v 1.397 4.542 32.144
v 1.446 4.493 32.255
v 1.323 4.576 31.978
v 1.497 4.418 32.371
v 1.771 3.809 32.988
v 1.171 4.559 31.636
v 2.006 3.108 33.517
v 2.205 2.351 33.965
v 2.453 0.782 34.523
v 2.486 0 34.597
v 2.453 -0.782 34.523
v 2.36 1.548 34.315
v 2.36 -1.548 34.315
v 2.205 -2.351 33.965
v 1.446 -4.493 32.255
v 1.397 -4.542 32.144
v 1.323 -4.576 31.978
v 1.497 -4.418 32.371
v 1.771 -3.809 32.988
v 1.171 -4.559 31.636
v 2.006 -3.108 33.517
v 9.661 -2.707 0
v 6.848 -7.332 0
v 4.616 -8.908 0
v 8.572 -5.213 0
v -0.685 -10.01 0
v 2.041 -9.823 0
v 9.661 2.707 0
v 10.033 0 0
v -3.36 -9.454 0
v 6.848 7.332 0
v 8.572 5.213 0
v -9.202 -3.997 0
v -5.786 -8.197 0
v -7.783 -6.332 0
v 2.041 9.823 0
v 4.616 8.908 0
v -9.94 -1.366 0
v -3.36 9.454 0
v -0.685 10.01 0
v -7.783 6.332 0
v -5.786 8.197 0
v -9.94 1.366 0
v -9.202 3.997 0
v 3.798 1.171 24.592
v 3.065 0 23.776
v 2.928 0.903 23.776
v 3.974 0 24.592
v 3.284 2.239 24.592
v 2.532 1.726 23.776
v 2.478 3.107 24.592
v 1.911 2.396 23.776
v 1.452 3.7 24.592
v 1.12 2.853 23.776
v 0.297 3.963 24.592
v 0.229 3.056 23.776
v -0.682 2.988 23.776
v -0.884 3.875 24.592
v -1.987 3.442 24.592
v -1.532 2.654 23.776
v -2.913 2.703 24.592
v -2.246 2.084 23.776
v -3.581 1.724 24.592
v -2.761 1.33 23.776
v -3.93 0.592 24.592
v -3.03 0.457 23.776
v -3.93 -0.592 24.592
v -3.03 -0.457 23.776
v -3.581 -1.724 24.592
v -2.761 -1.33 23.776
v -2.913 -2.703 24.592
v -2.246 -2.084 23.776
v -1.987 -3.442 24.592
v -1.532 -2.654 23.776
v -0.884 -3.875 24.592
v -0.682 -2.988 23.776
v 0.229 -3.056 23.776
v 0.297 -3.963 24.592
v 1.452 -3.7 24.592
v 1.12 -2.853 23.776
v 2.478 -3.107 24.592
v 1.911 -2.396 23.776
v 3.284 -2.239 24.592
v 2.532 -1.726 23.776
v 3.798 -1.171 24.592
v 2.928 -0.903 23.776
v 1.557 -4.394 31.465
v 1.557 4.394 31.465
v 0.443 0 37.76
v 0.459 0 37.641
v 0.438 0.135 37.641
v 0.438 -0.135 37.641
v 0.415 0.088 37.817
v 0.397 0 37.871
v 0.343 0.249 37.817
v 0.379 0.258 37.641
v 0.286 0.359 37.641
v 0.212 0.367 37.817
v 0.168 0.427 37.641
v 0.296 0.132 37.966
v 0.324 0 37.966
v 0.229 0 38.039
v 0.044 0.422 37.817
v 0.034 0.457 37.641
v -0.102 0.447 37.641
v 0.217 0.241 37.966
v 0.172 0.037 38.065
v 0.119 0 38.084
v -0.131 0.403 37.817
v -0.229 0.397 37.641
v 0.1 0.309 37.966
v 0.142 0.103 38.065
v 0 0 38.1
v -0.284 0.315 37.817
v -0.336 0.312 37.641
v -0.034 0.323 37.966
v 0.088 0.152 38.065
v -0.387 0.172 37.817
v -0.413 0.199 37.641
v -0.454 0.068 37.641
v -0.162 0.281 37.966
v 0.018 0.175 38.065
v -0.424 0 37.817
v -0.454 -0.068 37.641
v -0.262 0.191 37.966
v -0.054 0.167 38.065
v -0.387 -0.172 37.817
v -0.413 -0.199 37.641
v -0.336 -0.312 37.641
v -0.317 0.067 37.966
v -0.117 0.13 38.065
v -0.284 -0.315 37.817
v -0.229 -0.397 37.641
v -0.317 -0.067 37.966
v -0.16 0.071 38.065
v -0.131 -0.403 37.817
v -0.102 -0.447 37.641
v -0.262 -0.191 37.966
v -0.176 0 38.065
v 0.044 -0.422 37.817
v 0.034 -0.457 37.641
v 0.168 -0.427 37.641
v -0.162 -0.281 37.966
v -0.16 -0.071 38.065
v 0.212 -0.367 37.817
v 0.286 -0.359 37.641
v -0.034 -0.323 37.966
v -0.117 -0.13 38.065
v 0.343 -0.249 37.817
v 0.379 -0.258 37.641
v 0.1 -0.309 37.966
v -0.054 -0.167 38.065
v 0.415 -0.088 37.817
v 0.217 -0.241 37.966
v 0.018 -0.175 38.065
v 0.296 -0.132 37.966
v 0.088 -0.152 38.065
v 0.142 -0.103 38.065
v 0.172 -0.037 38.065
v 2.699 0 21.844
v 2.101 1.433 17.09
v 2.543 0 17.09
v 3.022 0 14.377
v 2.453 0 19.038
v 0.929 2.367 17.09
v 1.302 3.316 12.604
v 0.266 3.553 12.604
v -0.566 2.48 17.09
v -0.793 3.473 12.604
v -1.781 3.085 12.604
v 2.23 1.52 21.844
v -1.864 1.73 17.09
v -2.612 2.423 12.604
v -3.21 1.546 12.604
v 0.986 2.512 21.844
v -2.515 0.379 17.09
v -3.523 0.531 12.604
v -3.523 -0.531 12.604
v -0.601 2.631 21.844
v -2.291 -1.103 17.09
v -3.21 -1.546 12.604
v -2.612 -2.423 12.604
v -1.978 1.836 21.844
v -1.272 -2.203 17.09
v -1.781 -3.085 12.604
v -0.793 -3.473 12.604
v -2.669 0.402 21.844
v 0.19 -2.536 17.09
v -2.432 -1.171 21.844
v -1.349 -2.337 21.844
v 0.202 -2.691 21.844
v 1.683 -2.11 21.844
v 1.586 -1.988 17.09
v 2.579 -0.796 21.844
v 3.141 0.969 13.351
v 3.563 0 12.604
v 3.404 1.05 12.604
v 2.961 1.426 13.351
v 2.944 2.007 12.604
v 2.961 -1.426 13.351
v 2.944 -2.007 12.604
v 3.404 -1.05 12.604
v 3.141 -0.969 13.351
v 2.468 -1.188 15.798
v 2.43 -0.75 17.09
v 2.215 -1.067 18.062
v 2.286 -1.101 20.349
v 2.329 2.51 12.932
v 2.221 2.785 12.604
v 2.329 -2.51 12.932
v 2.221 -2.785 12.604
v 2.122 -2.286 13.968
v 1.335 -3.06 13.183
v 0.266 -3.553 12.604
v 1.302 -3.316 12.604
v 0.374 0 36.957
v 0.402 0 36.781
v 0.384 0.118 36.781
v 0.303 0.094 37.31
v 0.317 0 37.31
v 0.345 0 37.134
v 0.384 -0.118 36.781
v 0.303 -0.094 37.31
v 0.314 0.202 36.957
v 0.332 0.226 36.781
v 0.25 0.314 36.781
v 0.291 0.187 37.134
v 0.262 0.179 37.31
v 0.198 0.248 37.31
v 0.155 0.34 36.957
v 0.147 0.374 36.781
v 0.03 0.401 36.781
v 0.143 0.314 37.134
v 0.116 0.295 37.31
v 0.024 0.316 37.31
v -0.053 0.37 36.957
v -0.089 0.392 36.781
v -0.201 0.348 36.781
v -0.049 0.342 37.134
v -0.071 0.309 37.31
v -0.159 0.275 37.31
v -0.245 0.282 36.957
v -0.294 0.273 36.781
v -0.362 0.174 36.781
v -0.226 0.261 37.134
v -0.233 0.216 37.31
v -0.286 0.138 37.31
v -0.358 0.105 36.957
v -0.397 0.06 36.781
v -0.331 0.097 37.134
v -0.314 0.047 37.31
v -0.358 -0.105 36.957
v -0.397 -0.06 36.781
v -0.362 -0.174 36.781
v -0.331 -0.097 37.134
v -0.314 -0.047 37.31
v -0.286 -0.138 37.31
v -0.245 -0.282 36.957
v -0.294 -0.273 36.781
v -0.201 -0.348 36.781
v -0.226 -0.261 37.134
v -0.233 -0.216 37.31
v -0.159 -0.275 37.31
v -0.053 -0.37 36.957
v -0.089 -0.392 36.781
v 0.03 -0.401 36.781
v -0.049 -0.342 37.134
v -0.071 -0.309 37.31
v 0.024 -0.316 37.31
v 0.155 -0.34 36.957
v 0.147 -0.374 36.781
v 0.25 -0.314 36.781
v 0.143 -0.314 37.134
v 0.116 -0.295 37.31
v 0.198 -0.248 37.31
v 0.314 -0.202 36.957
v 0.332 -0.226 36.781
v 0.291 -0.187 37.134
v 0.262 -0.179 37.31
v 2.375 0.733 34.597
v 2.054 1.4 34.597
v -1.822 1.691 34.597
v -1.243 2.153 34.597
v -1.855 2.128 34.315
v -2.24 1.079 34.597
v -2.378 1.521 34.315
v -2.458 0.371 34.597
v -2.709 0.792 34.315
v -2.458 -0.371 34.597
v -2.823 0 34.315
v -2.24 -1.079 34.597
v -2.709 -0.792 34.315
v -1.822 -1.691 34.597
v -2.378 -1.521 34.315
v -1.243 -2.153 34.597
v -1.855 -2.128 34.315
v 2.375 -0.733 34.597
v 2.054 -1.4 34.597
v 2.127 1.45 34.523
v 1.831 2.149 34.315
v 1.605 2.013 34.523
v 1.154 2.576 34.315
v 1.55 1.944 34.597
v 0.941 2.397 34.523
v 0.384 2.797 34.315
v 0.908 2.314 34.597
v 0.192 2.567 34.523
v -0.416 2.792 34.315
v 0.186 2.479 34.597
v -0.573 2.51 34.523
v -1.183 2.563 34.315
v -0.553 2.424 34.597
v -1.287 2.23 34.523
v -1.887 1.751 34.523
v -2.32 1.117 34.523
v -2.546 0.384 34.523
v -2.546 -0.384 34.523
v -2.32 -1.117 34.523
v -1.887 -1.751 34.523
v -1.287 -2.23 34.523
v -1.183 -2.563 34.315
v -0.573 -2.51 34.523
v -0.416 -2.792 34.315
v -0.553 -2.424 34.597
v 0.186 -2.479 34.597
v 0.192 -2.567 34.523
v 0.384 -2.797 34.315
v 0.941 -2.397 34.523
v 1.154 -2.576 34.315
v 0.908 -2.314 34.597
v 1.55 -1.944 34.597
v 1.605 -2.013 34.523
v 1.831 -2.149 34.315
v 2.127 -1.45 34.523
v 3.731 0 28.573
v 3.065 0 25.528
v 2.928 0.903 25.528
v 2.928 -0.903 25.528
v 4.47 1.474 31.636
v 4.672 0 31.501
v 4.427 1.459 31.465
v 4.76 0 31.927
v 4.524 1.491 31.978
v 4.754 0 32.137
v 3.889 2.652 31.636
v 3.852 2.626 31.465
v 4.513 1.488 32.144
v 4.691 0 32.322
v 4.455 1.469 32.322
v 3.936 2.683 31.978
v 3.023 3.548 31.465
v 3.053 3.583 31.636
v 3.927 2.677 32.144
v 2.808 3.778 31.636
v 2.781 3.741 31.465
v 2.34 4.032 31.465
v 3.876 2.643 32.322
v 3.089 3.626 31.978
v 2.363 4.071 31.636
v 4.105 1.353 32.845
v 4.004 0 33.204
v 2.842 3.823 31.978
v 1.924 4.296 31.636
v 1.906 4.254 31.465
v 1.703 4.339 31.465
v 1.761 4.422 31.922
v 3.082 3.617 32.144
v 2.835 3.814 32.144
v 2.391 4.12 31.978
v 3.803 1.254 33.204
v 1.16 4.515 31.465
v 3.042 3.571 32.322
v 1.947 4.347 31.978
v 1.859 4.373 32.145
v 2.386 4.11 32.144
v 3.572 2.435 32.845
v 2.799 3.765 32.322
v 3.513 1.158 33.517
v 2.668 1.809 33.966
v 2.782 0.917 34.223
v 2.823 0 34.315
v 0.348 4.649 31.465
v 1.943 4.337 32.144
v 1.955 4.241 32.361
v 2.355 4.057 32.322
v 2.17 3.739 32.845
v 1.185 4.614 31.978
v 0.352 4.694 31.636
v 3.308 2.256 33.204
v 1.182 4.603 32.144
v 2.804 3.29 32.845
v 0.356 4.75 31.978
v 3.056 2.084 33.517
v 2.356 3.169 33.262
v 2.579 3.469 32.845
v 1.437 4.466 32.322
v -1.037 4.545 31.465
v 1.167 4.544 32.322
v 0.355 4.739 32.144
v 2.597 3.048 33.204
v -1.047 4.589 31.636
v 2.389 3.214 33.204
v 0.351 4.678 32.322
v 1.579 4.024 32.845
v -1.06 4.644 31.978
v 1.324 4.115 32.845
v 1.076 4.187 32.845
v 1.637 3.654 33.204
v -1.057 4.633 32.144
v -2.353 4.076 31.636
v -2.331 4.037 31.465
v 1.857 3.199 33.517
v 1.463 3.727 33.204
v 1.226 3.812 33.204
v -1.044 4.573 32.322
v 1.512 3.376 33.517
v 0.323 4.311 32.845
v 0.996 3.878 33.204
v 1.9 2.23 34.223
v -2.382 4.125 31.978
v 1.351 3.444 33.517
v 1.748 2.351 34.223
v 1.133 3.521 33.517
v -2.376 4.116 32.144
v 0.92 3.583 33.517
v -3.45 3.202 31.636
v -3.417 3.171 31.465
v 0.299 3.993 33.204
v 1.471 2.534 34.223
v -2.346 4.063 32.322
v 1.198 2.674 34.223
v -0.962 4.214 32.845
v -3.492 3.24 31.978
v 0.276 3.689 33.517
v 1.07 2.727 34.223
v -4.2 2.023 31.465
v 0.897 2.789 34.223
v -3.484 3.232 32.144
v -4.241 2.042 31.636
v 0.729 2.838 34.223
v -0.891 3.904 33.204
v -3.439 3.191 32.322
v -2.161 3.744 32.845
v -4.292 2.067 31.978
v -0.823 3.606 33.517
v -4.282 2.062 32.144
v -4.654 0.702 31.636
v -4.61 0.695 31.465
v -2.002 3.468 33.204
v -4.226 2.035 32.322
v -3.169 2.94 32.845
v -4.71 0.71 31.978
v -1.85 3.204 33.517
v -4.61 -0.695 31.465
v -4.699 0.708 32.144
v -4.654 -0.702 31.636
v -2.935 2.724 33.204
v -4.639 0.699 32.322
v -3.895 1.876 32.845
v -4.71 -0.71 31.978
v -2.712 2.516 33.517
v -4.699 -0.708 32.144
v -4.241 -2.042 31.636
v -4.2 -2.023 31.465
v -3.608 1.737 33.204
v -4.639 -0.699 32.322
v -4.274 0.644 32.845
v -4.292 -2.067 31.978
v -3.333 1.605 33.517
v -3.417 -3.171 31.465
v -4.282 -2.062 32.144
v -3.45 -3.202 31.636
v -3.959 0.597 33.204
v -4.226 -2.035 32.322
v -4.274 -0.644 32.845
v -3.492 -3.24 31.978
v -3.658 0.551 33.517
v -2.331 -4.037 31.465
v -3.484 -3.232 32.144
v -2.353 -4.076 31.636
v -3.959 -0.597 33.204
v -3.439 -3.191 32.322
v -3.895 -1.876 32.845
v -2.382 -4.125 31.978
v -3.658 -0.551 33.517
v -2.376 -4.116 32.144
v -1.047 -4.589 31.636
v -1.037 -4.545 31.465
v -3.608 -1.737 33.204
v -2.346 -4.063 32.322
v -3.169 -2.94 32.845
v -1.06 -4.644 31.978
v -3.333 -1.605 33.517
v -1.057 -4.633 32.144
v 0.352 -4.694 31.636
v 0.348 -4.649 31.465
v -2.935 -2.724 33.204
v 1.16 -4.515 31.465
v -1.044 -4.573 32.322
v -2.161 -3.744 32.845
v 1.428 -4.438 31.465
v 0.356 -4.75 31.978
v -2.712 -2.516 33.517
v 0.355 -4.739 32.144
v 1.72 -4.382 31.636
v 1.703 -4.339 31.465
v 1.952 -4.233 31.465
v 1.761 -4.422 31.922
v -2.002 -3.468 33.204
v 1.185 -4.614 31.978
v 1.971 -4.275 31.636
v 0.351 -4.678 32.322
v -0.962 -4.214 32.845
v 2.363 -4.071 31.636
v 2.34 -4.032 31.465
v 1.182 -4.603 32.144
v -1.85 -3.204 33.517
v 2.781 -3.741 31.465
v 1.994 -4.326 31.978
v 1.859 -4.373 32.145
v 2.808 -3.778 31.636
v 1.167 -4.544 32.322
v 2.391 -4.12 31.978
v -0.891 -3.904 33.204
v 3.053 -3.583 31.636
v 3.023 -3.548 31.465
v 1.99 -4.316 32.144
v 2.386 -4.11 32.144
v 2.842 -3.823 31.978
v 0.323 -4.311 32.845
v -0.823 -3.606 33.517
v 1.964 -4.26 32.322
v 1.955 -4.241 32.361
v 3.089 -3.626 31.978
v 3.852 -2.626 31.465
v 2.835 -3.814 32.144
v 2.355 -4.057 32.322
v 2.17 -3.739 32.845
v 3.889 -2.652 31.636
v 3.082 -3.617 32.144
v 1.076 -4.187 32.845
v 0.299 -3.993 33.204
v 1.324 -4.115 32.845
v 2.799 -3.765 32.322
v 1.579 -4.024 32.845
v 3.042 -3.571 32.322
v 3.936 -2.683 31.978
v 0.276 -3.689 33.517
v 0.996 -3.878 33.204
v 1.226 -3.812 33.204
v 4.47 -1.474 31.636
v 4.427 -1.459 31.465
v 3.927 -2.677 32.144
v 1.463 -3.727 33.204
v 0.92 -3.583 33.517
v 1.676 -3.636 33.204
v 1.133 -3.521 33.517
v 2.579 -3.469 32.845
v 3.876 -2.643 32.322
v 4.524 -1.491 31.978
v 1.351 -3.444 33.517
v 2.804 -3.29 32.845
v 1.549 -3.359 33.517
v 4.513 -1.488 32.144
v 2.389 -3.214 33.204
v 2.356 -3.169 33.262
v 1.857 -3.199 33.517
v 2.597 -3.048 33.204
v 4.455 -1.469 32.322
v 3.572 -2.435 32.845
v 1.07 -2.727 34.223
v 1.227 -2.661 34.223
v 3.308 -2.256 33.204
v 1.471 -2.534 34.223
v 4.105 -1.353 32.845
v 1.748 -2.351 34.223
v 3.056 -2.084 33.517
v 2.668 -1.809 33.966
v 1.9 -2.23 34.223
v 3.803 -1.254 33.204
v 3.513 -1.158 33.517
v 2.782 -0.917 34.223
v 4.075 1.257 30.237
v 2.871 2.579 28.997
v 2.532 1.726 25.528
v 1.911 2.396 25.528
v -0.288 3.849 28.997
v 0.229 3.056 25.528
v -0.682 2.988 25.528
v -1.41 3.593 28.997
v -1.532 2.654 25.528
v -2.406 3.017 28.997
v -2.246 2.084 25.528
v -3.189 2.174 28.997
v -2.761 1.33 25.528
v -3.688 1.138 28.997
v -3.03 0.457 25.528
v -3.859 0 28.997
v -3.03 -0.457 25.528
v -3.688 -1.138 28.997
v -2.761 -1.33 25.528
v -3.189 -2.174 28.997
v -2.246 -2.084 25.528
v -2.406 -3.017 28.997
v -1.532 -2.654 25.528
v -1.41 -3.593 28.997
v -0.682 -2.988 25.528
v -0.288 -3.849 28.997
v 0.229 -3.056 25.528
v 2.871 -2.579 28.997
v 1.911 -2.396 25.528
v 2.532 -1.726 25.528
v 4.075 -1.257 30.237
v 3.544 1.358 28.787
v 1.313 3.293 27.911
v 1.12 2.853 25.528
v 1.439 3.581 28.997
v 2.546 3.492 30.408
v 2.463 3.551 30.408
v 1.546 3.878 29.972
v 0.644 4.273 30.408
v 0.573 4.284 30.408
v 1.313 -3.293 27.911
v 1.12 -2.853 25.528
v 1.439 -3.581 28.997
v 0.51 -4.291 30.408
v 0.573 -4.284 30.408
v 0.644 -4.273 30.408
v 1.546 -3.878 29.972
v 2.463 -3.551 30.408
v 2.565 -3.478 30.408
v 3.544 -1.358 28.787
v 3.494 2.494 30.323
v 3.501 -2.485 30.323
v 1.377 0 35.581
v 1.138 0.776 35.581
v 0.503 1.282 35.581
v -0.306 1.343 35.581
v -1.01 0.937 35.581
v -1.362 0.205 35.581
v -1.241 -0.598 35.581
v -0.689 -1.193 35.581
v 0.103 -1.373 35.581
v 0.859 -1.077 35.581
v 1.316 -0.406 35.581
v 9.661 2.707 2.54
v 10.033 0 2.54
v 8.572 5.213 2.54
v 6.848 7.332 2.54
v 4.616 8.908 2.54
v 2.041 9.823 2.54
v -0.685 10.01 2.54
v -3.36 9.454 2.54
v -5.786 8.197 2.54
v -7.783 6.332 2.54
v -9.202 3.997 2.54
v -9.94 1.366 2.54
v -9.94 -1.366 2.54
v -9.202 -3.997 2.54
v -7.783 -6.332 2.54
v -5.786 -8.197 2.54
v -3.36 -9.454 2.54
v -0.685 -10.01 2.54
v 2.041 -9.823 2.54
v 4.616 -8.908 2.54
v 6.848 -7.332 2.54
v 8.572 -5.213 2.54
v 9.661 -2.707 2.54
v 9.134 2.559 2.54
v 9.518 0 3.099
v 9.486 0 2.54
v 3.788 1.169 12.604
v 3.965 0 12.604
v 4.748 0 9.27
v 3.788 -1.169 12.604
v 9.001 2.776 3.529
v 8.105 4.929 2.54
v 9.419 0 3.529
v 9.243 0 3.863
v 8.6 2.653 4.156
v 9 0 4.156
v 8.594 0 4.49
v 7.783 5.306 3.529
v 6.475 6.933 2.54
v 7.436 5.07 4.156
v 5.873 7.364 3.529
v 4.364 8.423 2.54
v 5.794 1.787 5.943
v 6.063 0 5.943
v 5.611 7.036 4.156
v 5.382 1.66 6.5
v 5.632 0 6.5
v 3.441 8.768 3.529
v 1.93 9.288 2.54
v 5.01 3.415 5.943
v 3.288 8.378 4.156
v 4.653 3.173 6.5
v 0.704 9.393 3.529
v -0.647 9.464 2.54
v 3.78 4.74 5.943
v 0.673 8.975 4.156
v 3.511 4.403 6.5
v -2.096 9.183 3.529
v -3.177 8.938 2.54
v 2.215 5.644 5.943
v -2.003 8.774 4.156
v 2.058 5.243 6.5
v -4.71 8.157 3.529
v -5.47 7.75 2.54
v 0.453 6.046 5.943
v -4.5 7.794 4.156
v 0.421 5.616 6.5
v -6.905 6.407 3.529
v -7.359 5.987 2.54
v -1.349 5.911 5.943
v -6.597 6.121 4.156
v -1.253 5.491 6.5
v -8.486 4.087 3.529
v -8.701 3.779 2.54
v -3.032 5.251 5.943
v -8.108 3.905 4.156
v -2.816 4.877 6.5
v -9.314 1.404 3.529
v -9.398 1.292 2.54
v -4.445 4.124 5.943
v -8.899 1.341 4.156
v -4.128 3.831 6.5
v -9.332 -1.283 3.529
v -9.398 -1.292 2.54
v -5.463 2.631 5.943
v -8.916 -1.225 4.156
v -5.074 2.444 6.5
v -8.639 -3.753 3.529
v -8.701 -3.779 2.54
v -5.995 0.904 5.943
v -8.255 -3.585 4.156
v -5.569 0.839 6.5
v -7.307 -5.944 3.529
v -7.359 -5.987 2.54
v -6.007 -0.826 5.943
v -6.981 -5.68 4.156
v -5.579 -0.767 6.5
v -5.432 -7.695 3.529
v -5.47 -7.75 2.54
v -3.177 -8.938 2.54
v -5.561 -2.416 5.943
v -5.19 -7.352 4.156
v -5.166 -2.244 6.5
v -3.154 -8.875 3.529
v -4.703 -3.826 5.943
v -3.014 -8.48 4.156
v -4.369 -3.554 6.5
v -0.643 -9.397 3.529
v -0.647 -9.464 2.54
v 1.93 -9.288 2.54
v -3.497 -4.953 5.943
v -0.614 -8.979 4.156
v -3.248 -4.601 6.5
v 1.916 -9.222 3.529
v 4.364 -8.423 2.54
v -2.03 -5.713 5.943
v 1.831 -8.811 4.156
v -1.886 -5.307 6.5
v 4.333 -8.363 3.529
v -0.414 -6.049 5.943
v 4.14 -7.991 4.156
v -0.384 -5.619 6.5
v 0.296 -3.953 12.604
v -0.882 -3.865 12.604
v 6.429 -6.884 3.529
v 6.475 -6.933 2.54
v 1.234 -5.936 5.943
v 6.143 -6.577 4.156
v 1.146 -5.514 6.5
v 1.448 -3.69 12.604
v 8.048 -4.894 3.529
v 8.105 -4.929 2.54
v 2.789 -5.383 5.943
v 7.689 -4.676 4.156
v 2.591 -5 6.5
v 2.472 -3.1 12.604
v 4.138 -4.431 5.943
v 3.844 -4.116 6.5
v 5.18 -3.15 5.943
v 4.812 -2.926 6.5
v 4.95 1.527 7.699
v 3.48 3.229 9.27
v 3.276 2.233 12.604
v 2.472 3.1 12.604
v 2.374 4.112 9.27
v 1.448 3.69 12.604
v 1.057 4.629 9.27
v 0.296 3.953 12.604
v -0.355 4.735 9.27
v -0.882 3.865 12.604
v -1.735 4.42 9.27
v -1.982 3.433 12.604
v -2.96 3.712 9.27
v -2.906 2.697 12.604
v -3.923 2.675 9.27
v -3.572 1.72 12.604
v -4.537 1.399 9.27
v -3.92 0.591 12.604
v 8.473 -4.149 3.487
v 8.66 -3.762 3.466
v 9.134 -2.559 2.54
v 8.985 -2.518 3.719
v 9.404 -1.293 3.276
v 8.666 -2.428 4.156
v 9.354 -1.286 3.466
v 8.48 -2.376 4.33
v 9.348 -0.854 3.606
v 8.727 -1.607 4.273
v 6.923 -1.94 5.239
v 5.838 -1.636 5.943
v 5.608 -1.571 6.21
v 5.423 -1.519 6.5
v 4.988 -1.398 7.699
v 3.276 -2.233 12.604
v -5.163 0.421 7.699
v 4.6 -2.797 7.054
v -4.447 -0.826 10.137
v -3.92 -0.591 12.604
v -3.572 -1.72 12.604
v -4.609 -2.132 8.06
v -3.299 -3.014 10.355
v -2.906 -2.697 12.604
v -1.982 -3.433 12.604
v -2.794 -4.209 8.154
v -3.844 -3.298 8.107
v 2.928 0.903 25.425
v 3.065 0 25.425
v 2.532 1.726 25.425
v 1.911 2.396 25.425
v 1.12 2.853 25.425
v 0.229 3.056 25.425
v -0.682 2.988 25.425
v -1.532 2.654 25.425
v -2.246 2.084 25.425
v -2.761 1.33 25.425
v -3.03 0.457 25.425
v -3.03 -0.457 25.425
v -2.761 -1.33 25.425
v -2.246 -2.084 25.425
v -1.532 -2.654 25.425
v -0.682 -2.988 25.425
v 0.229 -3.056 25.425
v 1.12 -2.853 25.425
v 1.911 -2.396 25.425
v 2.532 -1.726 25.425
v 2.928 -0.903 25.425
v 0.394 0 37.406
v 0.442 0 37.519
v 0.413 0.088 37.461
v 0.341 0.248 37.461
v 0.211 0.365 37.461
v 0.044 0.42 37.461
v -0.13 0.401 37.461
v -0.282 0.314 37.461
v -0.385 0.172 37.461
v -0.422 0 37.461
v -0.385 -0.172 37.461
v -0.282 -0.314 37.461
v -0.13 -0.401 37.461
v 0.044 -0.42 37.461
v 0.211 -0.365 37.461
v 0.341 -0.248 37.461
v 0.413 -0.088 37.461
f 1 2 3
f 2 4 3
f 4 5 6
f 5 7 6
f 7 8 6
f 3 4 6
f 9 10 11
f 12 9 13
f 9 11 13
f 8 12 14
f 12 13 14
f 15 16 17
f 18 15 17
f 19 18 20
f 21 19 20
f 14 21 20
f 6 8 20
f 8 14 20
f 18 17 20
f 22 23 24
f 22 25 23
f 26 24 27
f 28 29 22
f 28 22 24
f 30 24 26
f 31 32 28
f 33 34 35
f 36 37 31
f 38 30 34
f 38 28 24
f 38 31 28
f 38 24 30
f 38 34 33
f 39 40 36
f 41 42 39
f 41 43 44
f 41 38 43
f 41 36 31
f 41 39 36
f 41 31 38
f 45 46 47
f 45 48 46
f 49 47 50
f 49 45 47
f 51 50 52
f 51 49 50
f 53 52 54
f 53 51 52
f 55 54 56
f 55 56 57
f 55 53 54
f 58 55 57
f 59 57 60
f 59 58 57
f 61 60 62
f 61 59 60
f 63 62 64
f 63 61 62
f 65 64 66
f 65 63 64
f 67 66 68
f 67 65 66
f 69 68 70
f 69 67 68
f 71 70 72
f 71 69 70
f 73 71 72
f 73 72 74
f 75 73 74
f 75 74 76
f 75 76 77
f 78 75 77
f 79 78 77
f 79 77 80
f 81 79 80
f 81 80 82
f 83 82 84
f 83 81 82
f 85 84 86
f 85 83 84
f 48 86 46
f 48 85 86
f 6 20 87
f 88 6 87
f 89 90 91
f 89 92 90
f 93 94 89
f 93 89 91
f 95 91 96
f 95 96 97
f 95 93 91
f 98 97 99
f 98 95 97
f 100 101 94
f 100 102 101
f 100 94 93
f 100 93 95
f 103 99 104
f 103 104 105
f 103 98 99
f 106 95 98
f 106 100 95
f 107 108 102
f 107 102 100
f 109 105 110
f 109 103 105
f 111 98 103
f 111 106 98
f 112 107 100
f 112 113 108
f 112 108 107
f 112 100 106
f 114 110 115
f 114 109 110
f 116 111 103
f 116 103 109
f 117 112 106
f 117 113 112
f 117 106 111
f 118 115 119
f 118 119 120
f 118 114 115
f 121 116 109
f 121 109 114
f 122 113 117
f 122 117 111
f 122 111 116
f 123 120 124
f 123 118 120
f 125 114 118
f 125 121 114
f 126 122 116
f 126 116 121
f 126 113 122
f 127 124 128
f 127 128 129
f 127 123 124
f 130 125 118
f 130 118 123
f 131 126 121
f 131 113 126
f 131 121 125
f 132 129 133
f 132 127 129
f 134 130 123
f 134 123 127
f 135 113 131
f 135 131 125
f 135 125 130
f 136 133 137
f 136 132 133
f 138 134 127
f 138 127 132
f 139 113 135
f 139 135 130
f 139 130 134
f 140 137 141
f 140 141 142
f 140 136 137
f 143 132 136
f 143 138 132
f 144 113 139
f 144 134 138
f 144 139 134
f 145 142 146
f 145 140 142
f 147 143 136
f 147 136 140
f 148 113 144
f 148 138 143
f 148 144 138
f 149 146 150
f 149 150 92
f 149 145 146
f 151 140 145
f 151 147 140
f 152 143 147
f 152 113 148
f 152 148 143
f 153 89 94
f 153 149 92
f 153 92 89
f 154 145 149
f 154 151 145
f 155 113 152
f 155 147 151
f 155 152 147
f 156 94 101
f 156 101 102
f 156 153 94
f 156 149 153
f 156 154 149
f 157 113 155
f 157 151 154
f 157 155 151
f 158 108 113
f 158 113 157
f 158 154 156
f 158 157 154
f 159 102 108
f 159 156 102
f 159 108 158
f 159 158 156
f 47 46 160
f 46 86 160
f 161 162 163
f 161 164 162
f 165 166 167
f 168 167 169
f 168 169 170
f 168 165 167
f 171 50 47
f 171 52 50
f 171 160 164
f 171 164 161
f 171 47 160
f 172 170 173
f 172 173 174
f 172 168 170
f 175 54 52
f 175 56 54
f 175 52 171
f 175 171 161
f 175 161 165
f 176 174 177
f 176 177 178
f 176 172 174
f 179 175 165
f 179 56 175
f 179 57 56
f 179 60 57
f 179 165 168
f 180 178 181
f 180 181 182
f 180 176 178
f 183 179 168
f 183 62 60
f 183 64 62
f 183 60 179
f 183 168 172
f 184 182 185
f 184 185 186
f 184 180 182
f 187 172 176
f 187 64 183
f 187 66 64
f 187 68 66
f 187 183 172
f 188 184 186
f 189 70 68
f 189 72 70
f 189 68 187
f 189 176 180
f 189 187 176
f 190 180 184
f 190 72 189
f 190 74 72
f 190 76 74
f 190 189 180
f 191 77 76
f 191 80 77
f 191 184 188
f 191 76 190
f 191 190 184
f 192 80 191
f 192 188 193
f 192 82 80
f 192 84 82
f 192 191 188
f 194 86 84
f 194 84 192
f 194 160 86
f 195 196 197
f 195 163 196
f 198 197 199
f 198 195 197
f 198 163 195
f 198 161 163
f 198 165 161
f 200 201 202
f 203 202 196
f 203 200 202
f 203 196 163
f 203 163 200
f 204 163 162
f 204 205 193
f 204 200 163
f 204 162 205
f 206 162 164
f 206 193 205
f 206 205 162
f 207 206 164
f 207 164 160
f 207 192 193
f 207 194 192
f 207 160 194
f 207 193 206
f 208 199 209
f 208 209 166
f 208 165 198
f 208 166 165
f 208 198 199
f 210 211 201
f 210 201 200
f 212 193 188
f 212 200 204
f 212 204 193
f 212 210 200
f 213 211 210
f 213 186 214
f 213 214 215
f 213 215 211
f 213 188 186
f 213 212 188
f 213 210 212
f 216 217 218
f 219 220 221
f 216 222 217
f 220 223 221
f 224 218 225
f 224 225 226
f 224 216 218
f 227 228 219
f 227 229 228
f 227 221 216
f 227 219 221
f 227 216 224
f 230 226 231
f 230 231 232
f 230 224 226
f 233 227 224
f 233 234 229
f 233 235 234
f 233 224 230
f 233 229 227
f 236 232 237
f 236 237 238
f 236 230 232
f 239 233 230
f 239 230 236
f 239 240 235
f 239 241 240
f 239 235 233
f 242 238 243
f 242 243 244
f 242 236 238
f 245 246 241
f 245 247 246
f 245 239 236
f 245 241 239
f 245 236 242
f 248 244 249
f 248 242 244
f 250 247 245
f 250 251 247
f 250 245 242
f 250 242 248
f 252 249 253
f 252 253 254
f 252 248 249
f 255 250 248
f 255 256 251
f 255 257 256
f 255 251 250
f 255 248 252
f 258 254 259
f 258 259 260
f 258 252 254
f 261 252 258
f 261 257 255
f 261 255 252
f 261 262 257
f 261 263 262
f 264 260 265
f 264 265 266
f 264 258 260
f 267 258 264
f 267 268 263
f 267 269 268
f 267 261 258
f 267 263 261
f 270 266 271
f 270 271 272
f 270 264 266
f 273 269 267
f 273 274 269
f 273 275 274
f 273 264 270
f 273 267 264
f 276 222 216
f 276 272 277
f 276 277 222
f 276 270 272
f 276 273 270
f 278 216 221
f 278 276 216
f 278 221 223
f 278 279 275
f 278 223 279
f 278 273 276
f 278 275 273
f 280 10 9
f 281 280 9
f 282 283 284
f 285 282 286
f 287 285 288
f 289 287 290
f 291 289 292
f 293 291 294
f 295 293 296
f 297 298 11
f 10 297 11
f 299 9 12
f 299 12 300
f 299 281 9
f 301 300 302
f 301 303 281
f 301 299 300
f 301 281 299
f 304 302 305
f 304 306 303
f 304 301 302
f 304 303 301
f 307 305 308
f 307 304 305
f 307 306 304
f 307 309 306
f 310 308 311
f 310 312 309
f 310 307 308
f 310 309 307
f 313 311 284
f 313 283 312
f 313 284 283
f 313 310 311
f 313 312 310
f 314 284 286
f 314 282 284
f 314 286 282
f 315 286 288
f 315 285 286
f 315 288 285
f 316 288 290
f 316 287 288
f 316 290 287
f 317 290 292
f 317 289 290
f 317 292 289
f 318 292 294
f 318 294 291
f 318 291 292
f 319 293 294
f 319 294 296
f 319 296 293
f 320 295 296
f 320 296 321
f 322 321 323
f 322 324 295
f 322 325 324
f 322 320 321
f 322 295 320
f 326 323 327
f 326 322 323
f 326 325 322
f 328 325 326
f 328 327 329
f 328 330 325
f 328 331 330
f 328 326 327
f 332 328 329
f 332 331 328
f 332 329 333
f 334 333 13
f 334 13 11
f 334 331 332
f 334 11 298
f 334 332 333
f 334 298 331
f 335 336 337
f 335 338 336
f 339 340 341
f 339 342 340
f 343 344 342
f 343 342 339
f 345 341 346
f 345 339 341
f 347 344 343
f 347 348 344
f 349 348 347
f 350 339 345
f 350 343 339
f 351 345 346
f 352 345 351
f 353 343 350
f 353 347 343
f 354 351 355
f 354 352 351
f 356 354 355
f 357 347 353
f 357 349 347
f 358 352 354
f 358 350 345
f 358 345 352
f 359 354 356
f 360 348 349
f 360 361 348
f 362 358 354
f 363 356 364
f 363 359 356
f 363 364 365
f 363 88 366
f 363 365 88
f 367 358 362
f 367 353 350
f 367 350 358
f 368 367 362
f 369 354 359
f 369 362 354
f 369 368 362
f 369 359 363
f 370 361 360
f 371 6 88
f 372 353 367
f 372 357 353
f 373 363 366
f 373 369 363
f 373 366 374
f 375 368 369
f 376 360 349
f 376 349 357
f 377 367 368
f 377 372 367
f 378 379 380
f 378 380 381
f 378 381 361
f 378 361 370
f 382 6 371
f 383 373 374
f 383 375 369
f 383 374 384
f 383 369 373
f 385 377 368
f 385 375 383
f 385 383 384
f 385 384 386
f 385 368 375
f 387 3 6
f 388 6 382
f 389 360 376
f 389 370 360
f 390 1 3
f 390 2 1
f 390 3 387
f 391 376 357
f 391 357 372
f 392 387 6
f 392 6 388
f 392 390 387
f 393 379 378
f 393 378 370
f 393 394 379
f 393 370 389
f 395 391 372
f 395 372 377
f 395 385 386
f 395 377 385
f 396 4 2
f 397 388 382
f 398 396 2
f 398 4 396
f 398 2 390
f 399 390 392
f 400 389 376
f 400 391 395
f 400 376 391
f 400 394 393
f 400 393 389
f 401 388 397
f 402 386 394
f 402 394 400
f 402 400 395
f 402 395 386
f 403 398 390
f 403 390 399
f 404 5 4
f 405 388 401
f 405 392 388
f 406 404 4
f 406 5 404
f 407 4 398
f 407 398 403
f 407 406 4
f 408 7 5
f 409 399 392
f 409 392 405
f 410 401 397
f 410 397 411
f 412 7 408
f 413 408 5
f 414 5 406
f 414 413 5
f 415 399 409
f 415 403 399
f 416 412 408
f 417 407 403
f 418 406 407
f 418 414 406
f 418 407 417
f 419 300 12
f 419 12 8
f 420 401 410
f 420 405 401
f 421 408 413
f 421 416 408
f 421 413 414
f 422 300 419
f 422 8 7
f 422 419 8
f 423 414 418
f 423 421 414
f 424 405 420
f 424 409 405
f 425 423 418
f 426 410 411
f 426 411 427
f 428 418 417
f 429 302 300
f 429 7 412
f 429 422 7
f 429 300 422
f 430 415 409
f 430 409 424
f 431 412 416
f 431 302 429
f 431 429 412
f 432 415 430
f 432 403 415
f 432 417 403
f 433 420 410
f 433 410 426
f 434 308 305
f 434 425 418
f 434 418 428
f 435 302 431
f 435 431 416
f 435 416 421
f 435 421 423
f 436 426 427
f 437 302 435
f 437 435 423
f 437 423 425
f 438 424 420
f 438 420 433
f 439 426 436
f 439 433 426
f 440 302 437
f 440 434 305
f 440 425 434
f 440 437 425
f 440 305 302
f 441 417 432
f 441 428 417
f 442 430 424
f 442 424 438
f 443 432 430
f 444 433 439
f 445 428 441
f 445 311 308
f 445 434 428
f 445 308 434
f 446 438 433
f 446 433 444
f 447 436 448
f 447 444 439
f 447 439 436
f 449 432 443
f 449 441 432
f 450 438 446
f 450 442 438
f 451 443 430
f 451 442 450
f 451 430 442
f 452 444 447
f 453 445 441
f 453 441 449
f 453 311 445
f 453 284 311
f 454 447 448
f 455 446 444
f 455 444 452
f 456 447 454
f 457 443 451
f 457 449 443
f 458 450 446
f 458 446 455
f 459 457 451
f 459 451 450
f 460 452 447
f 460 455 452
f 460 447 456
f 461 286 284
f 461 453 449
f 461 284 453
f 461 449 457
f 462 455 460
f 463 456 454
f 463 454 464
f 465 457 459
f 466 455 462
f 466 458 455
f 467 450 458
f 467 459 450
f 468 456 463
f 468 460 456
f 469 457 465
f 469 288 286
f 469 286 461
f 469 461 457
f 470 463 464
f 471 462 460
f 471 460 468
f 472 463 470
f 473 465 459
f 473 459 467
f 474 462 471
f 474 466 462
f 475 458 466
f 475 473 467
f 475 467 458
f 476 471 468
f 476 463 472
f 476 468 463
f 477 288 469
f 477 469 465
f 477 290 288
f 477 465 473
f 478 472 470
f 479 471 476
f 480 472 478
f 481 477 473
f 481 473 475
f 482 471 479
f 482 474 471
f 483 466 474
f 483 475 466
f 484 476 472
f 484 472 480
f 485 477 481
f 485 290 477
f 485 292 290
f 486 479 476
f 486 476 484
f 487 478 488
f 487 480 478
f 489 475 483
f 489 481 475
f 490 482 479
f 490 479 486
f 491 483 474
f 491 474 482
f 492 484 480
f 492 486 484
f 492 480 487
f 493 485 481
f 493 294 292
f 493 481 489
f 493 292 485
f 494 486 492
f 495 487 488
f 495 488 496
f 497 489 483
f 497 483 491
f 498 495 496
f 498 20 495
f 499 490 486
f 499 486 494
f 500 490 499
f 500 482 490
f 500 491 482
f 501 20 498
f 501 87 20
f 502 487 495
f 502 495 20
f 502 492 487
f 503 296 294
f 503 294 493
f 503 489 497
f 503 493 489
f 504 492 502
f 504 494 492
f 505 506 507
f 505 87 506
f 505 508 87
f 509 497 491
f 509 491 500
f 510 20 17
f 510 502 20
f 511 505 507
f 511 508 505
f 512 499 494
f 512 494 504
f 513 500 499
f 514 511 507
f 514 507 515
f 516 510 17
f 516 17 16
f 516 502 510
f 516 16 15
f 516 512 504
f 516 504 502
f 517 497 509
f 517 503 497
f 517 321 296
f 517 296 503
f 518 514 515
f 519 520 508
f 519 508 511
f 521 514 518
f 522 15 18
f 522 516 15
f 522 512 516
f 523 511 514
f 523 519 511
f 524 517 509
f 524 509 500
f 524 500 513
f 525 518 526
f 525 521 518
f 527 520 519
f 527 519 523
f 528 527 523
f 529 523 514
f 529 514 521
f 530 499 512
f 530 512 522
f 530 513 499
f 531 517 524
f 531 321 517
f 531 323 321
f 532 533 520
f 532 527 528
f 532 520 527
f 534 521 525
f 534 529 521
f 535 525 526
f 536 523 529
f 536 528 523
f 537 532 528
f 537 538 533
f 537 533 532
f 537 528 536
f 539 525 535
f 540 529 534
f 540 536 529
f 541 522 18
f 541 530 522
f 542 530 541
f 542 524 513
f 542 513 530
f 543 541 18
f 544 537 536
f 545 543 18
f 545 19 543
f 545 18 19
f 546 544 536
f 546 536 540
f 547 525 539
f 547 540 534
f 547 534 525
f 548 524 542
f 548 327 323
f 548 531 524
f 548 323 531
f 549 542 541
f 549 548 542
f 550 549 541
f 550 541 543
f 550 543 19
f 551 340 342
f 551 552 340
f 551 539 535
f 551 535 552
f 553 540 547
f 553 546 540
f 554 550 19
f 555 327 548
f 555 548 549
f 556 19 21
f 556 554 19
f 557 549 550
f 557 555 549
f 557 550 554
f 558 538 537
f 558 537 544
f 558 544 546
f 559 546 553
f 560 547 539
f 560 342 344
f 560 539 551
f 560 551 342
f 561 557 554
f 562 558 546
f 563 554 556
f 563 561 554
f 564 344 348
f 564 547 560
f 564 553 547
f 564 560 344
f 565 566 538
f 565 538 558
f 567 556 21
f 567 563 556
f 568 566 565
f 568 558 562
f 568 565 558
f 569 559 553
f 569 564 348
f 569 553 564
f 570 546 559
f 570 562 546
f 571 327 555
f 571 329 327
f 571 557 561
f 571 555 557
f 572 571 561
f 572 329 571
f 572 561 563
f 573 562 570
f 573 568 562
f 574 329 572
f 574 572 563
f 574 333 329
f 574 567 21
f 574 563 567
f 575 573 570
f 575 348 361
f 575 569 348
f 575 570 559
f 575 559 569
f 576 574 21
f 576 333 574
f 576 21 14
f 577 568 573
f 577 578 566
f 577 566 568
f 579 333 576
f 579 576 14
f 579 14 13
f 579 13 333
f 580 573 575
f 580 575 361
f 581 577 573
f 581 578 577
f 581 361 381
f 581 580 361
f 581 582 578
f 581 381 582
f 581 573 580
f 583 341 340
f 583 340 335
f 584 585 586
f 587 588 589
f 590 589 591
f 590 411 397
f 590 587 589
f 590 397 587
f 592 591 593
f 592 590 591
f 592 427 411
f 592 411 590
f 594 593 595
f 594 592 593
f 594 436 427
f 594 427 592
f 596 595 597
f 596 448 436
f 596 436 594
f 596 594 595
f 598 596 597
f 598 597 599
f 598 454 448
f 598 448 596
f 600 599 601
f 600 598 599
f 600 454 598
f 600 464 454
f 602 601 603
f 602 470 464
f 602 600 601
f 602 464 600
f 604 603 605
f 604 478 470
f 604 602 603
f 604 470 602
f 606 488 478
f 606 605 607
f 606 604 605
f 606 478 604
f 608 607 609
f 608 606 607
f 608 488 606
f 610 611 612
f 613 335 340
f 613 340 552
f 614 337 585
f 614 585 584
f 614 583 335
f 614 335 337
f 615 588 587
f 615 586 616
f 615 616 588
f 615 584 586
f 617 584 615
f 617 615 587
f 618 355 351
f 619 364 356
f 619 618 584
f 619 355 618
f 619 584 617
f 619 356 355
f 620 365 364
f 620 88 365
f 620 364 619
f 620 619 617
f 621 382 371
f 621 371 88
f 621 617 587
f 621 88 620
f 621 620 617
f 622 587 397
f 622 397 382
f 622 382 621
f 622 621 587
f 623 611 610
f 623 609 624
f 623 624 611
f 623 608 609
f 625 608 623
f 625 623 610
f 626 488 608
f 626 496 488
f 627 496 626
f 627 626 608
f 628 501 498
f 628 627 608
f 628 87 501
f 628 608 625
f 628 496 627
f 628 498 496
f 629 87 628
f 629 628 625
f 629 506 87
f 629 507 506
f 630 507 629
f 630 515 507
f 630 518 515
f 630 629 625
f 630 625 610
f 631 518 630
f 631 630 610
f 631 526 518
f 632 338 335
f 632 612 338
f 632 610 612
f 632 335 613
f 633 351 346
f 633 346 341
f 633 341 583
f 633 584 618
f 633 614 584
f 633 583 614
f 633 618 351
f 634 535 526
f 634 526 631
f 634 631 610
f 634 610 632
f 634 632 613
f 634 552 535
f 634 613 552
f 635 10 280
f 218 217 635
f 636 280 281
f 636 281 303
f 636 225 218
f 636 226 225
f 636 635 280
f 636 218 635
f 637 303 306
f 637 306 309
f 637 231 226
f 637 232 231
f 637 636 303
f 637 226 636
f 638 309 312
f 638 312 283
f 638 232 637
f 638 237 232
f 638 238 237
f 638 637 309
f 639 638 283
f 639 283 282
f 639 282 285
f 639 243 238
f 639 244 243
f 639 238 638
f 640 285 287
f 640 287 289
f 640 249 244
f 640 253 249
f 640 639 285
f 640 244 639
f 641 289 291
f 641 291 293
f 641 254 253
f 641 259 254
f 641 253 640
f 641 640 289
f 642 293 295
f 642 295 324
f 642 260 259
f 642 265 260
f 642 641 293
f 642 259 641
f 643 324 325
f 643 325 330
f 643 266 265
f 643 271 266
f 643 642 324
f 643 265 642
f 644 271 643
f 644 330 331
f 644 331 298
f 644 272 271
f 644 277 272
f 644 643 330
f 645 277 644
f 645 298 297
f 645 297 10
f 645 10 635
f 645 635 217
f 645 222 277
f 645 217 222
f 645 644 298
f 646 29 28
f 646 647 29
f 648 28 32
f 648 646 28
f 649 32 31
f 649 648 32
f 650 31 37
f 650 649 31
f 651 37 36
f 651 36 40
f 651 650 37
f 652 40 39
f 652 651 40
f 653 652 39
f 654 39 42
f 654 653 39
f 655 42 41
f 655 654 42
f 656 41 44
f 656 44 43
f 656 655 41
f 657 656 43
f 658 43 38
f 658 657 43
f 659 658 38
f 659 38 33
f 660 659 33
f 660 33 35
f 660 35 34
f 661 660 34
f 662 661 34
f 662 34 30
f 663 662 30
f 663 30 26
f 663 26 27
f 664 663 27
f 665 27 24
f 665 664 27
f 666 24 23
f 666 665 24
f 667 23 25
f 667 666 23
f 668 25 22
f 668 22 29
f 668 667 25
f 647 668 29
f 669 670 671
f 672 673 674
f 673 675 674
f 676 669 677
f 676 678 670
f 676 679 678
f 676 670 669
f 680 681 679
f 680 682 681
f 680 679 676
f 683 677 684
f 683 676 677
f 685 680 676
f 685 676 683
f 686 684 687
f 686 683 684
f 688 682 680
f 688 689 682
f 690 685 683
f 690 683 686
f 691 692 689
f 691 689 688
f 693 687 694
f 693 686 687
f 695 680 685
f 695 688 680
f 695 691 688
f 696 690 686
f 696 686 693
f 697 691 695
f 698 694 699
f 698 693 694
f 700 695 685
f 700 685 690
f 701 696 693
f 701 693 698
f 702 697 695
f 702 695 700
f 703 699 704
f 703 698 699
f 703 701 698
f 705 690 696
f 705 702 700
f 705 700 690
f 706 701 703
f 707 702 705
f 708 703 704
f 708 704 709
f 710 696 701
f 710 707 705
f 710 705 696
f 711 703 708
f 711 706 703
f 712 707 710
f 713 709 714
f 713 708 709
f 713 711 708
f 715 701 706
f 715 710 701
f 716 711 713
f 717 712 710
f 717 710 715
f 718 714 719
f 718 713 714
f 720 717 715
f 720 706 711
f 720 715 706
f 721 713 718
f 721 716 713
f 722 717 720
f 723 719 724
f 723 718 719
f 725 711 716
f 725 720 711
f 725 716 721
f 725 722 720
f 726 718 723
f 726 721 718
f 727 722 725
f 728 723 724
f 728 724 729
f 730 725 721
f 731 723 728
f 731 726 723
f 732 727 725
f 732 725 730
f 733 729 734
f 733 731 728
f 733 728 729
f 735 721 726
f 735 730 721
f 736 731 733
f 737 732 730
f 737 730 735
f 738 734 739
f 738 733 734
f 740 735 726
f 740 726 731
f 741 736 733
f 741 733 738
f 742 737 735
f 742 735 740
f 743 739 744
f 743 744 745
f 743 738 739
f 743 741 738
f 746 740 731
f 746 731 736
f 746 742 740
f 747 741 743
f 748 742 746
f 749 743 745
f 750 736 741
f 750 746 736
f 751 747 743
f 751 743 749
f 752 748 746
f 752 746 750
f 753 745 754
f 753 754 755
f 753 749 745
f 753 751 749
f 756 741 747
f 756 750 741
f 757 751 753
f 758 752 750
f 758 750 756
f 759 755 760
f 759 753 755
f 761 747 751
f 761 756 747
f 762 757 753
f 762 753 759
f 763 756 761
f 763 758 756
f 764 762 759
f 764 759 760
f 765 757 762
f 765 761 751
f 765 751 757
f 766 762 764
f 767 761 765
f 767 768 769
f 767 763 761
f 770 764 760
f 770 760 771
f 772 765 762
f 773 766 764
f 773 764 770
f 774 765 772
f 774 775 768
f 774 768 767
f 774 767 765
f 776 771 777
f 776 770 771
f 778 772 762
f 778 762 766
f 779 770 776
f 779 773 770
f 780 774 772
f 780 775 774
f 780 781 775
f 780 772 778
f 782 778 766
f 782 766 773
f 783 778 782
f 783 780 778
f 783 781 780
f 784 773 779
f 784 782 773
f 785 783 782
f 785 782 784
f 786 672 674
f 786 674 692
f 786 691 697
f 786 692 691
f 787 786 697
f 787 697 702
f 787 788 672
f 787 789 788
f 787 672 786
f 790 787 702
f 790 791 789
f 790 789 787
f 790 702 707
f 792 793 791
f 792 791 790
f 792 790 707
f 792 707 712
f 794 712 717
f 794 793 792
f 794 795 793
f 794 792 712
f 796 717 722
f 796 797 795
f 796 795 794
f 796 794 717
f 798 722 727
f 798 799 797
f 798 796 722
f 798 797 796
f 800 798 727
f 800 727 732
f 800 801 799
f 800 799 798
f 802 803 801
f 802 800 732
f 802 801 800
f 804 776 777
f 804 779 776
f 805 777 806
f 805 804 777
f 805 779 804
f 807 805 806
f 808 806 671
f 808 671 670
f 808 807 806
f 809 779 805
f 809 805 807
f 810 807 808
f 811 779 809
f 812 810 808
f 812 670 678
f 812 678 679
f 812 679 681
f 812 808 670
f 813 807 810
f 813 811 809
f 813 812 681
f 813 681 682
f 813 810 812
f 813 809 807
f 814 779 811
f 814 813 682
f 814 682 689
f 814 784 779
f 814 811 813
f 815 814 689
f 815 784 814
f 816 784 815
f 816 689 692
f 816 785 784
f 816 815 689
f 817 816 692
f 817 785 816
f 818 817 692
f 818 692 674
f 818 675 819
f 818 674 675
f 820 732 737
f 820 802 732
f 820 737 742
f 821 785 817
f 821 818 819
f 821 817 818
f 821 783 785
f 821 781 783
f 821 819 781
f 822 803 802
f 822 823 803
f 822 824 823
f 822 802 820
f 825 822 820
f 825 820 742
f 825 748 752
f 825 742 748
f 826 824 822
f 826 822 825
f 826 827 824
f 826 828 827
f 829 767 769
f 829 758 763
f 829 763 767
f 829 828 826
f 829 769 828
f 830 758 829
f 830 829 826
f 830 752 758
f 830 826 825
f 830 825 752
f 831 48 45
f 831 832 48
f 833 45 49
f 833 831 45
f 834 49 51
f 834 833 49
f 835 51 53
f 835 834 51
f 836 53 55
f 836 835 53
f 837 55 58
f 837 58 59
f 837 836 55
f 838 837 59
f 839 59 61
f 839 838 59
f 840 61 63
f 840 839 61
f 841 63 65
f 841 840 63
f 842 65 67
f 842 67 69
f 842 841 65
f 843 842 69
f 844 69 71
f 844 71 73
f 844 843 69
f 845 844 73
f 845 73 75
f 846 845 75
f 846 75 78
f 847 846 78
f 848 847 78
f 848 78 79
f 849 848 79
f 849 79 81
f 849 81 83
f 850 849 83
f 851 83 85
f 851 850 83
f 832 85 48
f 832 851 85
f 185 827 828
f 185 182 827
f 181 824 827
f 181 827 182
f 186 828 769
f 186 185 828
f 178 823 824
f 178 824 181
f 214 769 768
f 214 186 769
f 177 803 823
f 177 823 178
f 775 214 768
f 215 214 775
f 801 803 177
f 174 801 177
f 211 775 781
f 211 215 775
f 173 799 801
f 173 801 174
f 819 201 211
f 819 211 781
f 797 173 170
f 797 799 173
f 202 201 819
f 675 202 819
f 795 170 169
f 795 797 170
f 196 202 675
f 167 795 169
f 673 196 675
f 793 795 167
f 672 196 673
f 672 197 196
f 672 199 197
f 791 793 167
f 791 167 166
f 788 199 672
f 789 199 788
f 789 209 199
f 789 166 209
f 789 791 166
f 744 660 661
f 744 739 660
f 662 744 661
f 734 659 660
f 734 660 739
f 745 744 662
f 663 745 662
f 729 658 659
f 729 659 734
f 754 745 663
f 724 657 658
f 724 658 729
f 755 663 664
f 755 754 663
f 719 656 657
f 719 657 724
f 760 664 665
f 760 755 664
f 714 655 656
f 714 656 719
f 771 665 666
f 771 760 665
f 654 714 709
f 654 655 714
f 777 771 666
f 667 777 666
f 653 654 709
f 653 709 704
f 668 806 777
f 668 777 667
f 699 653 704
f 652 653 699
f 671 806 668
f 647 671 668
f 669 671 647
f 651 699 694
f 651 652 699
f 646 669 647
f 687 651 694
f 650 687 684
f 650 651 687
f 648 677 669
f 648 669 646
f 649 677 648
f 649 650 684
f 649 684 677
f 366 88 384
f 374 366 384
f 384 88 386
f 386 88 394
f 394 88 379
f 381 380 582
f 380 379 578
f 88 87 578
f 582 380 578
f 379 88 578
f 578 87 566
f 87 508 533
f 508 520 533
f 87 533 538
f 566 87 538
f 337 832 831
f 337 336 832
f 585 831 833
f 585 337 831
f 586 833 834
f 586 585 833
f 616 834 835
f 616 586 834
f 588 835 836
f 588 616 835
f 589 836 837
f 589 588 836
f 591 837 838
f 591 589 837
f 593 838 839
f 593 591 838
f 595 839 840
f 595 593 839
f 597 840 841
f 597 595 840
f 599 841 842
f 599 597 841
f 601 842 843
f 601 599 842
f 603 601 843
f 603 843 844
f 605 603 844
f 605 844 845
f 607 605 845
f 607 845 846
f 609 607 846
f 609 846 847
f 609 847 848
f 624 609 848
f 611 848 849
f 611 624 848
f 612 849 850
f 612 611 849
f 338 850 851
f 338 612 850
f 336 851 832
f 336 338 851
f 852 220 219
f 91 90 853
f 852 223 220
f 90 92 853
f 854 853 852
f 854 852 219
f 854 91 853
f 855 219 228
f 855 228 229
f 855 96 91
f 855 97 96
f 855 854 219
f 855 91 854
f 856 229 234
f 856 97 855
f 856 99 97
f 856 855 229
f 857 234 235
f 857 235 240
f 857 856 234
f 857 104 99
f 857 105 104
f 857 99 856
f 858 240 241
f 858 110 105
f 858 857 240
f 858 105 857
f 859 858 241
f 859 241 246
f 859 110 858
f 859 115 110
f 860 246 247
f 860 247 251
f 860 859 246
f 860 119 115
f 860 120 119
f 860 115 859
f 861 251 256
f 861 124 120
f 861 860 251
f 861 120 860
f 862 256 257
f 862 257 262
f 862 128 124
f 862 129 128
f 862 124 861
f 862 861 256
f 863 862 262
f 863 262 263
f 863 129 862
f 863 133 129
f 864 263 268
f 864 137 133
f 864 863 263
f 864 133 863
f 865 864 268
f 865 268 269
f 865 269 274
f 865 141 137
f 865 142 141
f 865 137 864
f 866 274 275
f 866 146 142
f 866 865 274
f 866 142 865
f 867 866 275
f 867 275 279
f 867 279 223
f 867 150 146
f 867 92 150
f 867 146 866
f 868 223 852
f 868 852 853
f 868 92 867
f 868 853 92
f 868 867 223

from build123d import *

# Parameters (mm, degrees)
F2_DEPTH = 25.4
F3_DEPTH = 25.4


with BuildPart() as f1:
    # F0 (on Front) → F1 (revolve)
    with BuildSketch(Plane.XZ):
        Polygon((0, 2.54), (0, 0), (10.033, 0), (10.033, 2.54), (9.4861555845, 2.54), align=None)
        with BuildLine():
            Line((0, 37.1824353933), (0, 2.54))
            Line((0, 2.54), (9.4861555845, 2.54))
            add(Edge.make_bspline(
                [(9.4861555845, 2.54), (9.8453891211, 4.4276976498), (5.9179255985, 5.2618132952), (5.1336004733, 7.762343265), (4.2204660289, 11.2245860249), (3.9645507932, 12.6038566232)],
                knots=[0, 0, 0, 0, 0.3490450724, 0.624870565, 1, 1, 1, 1], degree=3))
            Line((3.9645507932, 12.6038566232), (3.5626941826, 12.6038566232))
            add(Edge.make_bspline(
                [(3.5626941826, 12.6038566232), (3.2031516008, 13.3255932383), (2.4760706241, 16.8640443681), (2.3654149475, 19.4231070959), (2.8490578857, 23.2332946699), (3.0645283405, 23.775851354)],
                knots=[0, 0, 0, 0, 0.3450697936, 0.657036582, 1, 1, 1, 1], degree=3))
            Line((3.0645283405, 23.775851354), (3.9743119851, 24.5918147266))
            Line((3.9743119851, 24.5918147266), (3.0645283405, 25.425276343))
            Line((3.0645283405, 25.425276343), (3.0645283405, 25.5275927484))
            add(Edge.make_bspline(
                [(3.0645283405, 25.5275927484), (3.3999102429, 28.2161597708), (4.9036466919, 31.6129373063), (4.7012289547, 32.4872237799), (3.7060201327, 33.5572204547), (2.9138410483, 34.2374070059), (2.8228225087, 34.3145662132)],
                knots=[0, 0, 0, 0, 0.3715523633, 0.4947830291, 0.7141040095, 0.7421667067, 0.7421667067, 0.7421667067, 0.7421667067], degree=3))
            Line((2.8228225087, 34.3145662132), (1.5574188822, 31.4649180467))
            Line((1.5574188822, 31.4649180467), (1.1711250779, 31.6364541636))
            Line((1.1711250779, 31.6364541636), (2.4859273687, 34.597346529))
            add(Edge.make_bspline(
                [(2.4859273687, 34.597346529), (1.7439141747, 35.2174579169), (0.9664492324, 35.8714870687), (0.401673026, 36.7812261591)],
                knots=[0.7763528136, 0.7763528136, 0.7763528136, 0.7763528136, 1, 1, 1, 1], degree=3))
            Line((0.401673026, 36.7812261591), (0.3172948102, 37.3098490119))
            ThreePointArc((0.3172948102, 37.3098490119), (0.1709606876, 37.2154787565), (0, 37.1824353933))
        make_face()
        with BuildLine():
            Line((0, 38.1), (0, 37.1824353933))
            ThreePointArc((0, 37.1824353933), (0.1709606876, 37.2154787565), (0.3172948102, 37.3098490119))
            ThreePointArc((0.3172948102, 37.3098490119), (0.4219303531, 37.4610622666), (0.4587823033, 37.6412176967))
            ThreePointArc((0.4587823033, 37.6412176967), (0.3244080778, 37.9656257744), (0, 38.1))
        make_face()
        with BuildLine():
            add(Edge.make_bspline(
                [(2.8228225087, 34.3145662132), (2.7119433048, 34.4085619146), (2.5993495081, 34.5025579715), (2.4859273687, 34.597346529)],
                knots=[0.7421667067, 0.7421667067, 0.7421667067, 0.7421667067, 0.7763528136, 0.7763528136, 0.7763528136, 0.7763528136], degree=3))
            Line((2.4859273687, 34.597346529), (1.1711250779, 31.6364541636))
            Line((1.1711250779, 31.6364541636), (1.5574188822, 31.4649180467))
            Line((1.5574188822, 31.4649180467), (2.8228225087, 34.3145662132))
        make_face()
    revolve(axis=Axis((0, 0, 19.05), (0, 0, 1)))

    # F0 (on Front) → F2 (cut)
    with BuildSketch(Plane.XZ):
        with BuildLine():
            Line((3.5590358397, 37.0139522053), (2.4859273687, 34.597346529))
            add(Edge.make_bspline(
                [(2.8228225087, 34.3145662132), (2.7119433048, 34.4085619146), (2.5993495081, 34.5025579715), (2.4859273687, 34.597346529)],
                knots=[0.7421667067, 0.7421667067, 0.7421667067, 0.7421667067, 0.7763528136, 0.7763528136, 0.7763528136, 0.7763528136], degree=3))
            Line((2.8228225087, 34.3145662132), (3.9516790885, 36.8567148328))
            Line((3.9516790885, 36.8567148328), (3.5590358397, 37.0139522053))
        make_face()
        with BuildLine():
            add(Edge.make_bspline(
                [(2.8228225087, 34.3145662132), (2.7119433048, 34.4085619146), (2.5993495081, 34.5025579715), (2.4859273687, 34.597346529)],
                knots=[0.7421667067, 0.7421667067, 0.7421667067, 0.7421667067, 0.7763528136, 0.7763528136, 0.7763528136, 0.7763528136], degree=3))
            Line((2.4859273687, 34.597346529), (1.1711250779, 31.6364541636))
            Line((1.1711250779, 31.6364541636), (1.5574188822, 31.4649180467))
            Line((1.5574188822, 31.4649180467), (2.8228225087, 34.3145662132))
        make_face()
    extrude(amount=-F2_DEPTH, mode=Mode.SUBTRACT)

    # F3 (cut): a face of the model
    f3_faces = [f1.faces().sort_by_distance(p)[0] for p in [
        (2.0082250792, 0, 33.0041671759),
    ]]
    extrude(f3_faces, amount=-F3_DEPTH, mode=Mode.SUBTRACT)


solid = f1.part
